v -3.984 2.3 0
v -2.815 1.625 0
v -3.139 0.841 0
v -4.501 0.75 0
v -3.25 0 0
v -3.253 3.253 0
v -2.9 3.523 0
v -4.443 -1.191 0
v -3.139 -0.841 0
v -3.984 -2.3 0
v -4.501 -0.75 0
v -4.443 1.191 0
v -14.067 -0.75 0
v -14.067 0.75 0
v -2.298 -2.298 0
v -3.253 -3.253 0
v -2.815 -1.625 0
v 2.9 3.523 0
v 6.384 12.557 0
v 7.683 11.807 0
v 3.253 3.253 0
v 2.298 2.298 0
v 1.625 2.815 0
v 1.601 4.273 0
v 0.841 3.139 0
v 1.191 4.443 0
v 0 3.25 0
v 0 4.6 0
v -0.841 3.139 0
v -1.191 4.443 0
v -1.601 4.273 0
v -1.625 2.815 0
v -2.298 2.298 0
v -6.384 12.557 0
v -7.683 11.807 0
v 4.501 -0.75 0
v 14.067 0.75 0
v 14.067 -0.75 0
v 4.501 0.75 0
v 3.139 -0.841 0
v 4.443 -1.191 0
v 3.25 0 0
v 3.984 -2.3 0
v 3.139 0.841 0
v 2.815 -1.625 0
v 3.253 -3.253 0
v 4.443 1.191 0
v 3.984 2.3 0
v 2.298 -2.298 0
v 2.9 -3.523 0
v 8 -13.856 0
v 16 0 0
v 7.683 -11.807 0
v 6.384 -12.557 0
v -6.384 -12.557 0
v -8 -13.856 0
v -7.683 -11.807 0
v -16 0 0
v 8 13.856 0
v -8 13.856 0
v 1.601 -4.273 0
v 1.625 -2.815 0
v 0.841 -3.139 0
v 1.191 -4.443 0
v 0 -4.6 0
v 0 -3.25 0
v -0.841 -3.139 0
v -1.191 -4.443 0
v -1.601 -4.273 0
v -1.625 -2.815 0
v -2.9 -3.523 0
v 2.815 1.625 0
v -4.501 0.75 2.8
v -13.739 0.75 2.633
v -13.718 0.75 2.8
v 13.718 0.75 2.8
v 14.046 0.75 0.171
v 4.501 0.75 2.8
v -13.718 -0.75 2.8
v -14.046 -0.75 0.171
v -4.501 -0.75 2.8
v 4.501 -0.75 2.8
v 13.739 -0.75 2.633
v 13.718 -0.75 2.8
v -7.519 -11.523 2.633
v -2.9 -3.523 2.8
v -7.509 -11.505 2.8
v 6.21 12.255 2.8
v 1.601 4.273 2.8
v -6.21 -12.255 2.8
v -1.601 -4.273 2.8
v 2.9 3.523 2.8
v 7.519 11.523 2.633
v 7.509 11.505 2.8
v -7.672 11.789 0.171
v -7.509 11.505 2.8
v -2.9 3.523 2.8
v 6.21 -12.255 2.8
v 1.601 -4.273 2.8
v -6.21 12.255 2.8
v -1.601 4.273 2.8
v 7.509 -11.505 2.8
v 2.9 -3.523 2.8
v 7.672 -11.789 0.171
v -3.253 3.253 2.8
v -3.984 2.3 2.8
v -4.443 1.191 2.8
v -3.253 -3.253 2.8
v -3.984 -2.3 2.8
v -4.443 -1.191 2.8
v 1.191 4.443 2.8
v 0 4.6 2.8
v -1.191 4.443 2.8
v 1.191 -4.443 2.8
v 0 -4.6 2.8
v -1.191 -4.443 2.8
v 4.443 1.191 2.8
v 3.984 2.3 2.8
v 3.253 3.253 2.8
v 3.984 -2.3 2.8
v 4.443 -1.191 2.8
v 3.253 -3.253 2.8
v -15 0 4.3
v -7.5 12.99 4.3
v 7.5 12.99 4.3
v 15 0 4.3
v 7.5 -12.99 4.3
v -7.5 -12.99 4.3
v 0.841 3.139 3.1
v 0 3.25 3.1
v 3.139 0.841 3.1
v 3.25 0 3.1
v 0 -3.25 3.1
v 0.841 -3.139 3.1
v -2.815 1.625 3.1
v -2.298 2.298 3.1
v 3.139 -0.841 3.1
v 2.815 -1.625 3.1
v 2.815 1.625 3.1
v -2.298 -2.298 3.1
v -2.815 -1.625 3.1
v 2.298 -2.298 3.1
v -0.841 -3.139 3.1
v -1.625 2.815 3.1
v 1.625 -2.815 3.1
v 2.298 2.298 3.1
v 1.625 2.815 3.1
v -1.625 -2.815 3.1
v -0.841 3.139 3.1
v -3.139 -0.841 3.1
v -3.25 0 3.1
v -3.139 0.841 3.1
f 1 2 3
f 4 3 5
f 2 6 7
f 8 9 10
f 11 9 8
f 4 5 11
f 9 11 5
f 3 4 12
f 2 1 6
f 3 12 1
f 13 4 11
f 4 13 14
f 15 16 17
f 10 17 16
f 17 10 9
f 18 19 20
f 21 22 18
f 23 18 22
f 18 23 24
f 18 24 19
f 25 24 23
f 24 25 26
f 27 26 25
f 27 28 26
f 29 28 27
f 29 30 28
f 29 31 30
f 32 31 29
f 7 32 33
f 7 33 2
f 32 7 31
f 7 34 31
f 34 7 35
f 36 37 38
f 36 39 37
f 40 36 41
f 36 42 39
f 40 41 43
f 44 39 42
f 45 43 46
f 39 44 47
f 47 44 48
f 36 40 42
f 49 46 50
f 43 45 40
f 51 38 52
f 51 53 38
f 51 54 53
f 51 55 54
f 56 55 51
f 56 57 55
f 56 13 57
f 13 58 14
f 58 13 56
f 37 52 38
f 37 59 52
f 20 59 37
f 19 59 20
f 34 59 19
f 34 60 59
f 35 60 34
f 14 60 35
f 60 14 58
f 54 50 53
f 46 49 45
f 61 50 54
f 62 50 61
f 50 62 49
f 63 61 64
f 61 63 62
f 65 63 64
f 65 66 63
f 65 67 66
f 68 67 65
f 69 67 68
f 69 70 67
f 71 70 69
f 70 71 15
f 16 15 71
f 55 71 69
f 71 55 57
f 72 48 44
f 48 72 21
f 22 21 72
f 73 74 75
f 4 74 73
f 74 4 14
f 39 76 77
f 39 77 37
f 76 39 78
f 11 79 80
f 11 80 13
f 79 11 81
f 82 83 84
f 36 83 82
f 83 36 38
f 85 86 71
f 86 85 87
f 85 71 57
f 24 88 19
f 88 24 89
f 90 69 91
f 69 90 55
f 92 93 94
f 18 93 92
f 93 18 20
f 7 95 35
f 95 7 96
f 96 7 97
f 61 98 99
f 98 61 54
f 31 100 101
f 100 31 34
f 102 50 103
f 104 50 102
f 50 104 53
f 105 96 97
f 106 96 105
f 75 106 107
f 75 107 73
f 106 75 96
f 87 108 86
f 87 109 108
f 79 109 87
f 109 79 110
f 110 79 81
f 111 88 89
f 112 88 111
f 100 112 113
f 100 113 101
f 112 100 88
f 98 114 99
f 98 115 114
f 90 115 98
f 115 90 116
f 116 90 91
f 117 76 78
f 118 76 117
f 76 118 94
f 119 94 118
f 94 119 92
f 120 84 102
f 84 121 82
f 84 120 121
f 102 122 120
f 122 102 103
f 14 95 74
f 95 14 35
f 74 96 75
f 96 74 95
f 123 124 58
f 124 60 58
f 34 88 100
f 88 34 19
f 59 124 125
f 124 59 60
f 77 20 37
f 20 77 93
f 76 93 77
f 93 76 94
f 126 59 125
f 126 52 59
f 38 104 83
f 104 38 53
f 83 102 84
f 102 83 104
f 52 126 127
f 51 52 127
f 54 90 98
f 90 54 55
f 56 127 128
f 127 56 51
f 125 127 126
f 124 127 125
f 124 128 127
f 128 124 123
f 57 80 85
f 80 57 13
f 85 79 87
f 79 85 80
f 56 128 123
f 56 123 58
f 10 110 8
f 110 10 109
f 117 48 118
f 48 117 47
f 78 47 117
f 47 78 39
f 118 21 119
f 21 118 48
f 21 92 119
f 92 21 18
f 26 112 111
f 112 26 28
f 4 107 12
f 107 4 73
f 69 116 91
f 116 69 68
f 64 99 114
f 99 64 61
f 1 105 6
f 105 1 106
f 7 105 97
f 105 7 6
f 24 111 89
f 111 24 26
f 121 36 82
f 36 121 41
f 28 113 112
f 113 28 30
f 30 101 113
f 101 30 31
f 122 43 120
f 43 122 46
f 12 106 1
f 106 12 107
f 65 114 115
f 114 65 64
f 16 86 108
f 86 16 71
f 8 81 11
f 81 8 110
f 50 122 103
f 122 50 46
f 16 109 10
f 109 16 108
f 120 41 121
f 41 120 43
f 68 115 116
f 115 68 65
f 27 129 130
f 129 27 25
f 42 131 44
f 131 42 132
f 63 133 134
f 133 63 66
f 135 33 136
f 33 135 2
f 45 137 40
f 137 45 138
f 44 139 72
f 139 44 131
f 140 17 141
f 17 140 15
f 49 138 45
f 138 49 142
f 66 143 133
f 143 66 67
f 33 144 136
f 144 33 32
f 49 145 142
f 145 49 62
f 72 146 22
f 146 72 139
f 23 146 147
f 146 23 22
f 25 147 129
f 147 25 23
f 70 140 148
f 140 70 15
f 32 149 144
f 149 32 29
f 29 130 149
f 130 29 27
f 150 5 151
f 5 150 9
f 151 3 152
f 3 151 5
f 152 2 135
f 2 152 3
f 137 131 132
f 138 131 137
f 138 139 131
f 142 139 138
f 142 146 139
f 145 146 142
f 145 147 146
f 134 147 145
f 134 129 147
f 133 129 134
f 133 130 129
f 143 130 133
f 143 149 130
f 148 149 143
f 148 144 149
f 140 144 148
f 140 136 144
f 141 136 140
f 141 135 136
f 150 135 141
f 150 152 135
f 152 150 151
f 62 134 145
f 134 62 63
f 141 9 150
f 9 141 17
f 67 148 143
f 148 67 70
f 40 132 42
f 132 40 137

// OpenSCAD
// file: girl/girl_common.scad
// Copyright 2025 Natalie Baker // Apache v2 //

base_size  = 32;
wall_width =  9;

magnet_dia    = 6.2;
magnet_height = 2.8;

lock_height   = 1.9;
lock_depth    = 4.9;
lock_width    = 11;

lock_hole_dia = 2.25;

grid_size   = base_size + 2*wall_width;
grid_diag   = sqrt(2*grid_size*grid_size);
grid_height = max(lock_height, magnet_height)+1.2;

frame_size = 2.4;

module repeat(size, x, y, z, center) {
	off = center 
		? [(x-1)*size[0],(y-1)*size[1],(z-1)*size[2]]/2 
		: [0,0,0];

	for(i = [0 : x-1])
	for(j = [0 : y-1])
	for(k = [0 : z-1])
		translate([
			size[0]*i-off[0],
			size[1]*j-off[1],
			size[2]*k-off[2]
		]) children();
}
// file: girl/girl_base.scad
// Copyright 2025 Natalie Baker // Apache v2 //

include<girl_common.scad>;

base_thickness = 1.5;
base_gap       = magnet_height;

base_rad      = base_size/2;
base_rad_top  = (base_size - 2)/2;
base_rad_in   = base_rad_top+(base_rad-base_rad_top)*(base_gap/(base_thickness+base_gap));
 
girl_base();

module girl_base() {
	$fn=24;
	difference() {
		union() {
			_girl_base_part();
			cylinder(d=magnet_dia+2*base_thickness, h=base_gap);
			
			for(i = [0:2])
			rotate(60*i)
			linear_extrude(base_gap)
			square([base_size-1.45*base_thickness,base_thickness], center=true);
		}
		
		_girl_base_magnet_hole();
	}
}

module _girl_base_part() {
	rotate_extrude($fn=6)
	intersection() {
		polygon([ 
			[                  base_rad,                       0],
			[              base_rad_top, base_thickness+base_gap],
			[                        -1, base_thickness+base_gap],
			[                        -1,                base_gap],
			[base_rad_in-base_thickness,                base_gap],
			[base_rad   -base_thickness,                       0],
		]);
		square([base_rad, base_thickness+base_gap]);
	}
}

module _girl_base_magnet_hole(tolerance=0.15) {
	mad_d = magnet_dia+2*tolerance;
	mag_h = magnet_height+2*tolerance;
	
	translate([0,0,-0.05])
	cylinder(d=mad_d, h=mag_h+0.05);
}
// main file
// Copyright 2025 Natalie Baker // Apache v2 //

use<girl/girl_base.scad>;

girl_base();
